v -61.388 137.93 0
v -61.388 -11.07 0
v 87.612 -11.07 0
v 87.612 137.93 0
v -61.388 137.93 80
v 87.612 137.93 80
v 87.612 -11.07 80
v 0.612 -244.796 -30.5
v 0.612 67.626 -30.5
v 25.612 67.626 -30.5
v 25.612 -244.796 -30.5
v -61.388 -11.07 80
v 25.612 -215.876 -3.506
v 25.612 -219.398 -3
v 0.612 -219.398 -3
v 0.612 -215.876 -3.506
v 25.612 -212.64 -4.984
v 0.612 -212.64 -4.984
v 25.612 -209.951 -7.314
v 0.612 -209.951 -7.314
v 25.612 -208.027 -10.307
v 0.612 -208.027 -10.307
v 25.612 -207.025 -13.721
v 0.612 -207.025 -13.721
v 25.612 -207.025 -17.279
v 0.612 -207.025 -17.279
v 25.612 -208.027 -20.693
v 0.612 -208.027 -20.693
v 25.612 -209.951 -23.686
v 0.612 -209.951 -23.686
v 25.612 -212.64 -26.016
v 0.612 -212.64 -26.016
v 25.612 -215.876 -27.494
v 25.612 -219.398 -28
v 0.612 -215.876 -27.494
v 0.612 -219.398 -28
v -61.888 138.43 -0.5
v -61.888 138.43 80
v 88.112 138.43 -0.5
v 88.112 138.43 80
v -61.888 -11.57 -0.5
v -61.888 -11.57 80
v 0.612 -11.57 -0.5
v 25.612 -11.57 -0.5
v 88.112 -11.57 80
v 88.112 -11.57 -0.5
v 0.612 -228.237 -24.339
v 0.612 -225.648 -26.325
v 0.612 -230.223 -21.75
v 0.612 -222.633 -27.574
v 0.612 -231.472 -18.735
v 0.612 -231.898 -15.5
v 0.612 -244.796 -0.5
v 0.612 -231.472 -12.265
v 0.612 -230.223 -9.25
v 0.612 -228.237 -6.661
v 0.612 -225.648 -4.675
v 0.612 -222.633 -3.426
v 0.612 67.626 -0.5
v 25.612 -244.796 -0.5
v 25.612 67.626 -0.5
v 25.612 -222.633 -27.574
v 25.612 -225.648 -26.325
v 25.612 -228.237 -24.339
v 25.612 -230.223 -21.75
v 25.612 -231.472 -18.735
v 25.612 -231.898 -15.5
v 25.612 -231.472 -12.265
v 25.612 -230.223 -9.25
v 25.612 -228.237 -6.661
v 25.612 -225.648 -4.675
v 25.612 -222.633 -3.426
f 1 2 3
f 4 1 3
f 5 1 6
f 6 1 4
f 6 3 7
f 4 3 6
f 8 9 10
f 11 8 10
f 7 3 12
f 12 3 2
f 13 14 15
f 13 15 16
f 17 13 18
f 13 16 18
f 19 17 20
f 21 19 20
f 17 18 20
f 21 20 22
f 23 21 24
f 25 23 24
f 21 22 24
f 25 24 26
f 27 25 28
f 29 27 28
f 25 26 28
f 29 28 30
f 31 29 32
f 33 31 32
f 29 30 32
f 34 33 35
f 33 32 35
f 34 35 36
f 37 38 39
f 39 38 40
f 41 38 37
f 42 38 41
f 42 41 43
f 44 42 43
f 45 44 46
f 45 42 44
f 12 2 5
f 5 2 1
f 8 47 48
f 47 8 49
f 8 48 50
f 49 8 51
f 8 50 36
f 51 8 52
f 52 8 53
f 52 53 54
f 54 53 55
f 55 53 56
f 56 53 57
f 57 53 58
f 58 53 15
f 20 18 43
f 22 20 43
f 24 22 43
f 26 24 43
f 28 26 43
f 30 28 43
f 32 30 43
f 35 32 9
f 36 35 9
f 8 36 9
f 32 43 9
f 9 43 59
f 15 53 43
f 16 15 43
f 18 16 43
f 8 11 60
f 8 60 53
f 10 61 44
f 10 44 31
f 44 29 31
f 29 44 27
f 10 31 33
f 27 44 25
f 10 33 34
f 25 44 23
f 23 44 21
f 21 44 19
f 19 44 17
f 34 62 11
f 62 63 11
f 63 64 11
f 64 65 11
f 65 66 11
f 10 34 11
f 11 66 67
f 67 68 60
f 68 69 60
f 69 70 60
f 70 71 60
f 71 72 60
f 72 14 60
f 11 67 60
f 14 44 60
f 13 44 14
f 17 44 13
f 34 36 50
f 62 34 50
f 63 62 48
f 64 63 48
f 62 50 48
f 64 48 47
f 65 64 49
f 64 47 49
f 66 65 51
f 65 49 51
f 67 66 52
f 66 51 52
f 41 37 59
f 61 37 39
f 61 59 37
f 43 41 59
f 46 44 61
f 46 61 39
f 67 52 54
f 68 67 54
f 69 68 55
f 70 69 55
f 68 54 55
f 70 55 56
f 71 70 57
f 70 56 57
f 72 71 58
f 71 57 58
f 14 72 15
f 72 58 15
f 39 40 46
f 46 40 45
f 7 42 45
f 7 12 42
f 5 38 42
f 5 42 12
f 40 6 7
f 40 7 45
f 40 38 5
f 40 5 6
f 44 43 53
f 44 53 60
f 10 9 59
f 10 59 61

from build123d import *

# Parameters (mm, degrees)
F0_W     = 0.5
F0_H     = 149
F1_DEPTH = 80
F2_W     = 150
F2_H     = 150
F3_DEPTH = 0.5
F5_DEPTH = 30
F7_DEPTH = 87.501
F9_DEPTH = 87.501


with BuildPart() as f1:
    # F0 (on Top) → F1 (new body)
    with BuildSketch(Plane.XY):
        Polygon((88.1122936055, 138.4297020262), (-61.8877063945, 138.4297020262), (-61.8877063945, 137.9297020262), (-61.3877063945, 137.9297020262), (87.6122936055, 137.9297020262), (88.1122936055, 137.9297020262), align=None)
        with Locations((-61.6377063945, 63.4297020262)):
            Rectangle(F0_W, F0_H)
        with Locations((87.8622936055, 63.4297020262)):
            Rectangle(F0_W, F0_H)
        Polygon((-61.3877063945, -11.0702979738), (-61.8877063945, -11.0702979738), (-61.8877063945, -11.5702979738), (88.1122936055, -11.5702979738), (88.1122936055, -11.0702979738), (87.6122936055, -11.0702979738), align=None)
    extrude(amount=F1_DEPTH)

    # F2 (on face) → F3 (join)
    with BuildSketch(Plane(origin=(0, 0, 0), x_dir=(1, 0, 0), z_dir=(0, 0, -1))):
        with Locations((13.1122936055, -63.4297020262)):
            Rectangle(F2_W, F2_H)
    extrude(amount=F3_DEPTH)

    # F4 (on face) → F5 (join)
    with BuildSketch(Plane(origin=(0, 0, -0.5), x_dir=(1, 0, 0), z_dir=(0, 0, -1))):
        Polygon((0.6122936055, -67.6260187756), (25.6122936055, -67.6260187756), (25.6122936055, 11.5702979738), (25.6122936055, 244.7964921594), (0.6122936055, 244.7964921594), (0.6122936055, 11.5702979738), align=None)
    extrude(amount=F5_DEPTH)

    # F6 (on face) → F7 (cut, through all)
    with BuildSketch(Plane.YZ.offset(25.6122936055)):
        with BuildLine():
            Line((85.952706635, -16.575855797), (85.952706635, -14.424144203))
            ThreePointArc((85.952706635, -14.424144203), (84.876850838, -15.5), (85.952706635, -16.575855797))
        make_face()
        with BuildLine():
            ThreePointArc((87.028562432, -15.5), (86.7134515646, -14.7392550704), (85.952706635, -14.424144203))
            Line((85.952706635, -14.424144203), (85.952706635, -16.575855797))
            ThreePointArc((85.952706635, -16.575855797), (86.7134515646, -16.2607449296), (87.028562432, -15.5))
        make_face()
    extrude(amount=-F7_DEPTH, mode=Mode.SUBTRACT)

    # F8 (on face) → F9 (cut, through all)
    with BuildSketch(Plane(origin=(0.6122936055, 0, 0), x_dir=(0, -1, 0), z_dir=(-1, 0, 0))):
        with BuildLine():
            ThreePointArc((231.8976938725, -15.5), (228.2365286373, -6.6611652352), (219.3976938725, -3))
            Line((219.3976938725, -3), (219.3976938725, -28))
            ThreePointArc((219.3976938725, -28), (228.2365286373, -24.3388347648), (231.8976938725, -15.5))
        make_face()
        with BuildLine():
            Line((219.3976938725, -28), (219.3976938725, -3))
            ThreePointArc((219.3976938725, -3), (206.8976938725, -15.5), (219.3976938725, -28))
        make_face()
    extrude(amount=-F9_DEPTH, mode=Mode.SUBTRACT)


solid = f1.part
